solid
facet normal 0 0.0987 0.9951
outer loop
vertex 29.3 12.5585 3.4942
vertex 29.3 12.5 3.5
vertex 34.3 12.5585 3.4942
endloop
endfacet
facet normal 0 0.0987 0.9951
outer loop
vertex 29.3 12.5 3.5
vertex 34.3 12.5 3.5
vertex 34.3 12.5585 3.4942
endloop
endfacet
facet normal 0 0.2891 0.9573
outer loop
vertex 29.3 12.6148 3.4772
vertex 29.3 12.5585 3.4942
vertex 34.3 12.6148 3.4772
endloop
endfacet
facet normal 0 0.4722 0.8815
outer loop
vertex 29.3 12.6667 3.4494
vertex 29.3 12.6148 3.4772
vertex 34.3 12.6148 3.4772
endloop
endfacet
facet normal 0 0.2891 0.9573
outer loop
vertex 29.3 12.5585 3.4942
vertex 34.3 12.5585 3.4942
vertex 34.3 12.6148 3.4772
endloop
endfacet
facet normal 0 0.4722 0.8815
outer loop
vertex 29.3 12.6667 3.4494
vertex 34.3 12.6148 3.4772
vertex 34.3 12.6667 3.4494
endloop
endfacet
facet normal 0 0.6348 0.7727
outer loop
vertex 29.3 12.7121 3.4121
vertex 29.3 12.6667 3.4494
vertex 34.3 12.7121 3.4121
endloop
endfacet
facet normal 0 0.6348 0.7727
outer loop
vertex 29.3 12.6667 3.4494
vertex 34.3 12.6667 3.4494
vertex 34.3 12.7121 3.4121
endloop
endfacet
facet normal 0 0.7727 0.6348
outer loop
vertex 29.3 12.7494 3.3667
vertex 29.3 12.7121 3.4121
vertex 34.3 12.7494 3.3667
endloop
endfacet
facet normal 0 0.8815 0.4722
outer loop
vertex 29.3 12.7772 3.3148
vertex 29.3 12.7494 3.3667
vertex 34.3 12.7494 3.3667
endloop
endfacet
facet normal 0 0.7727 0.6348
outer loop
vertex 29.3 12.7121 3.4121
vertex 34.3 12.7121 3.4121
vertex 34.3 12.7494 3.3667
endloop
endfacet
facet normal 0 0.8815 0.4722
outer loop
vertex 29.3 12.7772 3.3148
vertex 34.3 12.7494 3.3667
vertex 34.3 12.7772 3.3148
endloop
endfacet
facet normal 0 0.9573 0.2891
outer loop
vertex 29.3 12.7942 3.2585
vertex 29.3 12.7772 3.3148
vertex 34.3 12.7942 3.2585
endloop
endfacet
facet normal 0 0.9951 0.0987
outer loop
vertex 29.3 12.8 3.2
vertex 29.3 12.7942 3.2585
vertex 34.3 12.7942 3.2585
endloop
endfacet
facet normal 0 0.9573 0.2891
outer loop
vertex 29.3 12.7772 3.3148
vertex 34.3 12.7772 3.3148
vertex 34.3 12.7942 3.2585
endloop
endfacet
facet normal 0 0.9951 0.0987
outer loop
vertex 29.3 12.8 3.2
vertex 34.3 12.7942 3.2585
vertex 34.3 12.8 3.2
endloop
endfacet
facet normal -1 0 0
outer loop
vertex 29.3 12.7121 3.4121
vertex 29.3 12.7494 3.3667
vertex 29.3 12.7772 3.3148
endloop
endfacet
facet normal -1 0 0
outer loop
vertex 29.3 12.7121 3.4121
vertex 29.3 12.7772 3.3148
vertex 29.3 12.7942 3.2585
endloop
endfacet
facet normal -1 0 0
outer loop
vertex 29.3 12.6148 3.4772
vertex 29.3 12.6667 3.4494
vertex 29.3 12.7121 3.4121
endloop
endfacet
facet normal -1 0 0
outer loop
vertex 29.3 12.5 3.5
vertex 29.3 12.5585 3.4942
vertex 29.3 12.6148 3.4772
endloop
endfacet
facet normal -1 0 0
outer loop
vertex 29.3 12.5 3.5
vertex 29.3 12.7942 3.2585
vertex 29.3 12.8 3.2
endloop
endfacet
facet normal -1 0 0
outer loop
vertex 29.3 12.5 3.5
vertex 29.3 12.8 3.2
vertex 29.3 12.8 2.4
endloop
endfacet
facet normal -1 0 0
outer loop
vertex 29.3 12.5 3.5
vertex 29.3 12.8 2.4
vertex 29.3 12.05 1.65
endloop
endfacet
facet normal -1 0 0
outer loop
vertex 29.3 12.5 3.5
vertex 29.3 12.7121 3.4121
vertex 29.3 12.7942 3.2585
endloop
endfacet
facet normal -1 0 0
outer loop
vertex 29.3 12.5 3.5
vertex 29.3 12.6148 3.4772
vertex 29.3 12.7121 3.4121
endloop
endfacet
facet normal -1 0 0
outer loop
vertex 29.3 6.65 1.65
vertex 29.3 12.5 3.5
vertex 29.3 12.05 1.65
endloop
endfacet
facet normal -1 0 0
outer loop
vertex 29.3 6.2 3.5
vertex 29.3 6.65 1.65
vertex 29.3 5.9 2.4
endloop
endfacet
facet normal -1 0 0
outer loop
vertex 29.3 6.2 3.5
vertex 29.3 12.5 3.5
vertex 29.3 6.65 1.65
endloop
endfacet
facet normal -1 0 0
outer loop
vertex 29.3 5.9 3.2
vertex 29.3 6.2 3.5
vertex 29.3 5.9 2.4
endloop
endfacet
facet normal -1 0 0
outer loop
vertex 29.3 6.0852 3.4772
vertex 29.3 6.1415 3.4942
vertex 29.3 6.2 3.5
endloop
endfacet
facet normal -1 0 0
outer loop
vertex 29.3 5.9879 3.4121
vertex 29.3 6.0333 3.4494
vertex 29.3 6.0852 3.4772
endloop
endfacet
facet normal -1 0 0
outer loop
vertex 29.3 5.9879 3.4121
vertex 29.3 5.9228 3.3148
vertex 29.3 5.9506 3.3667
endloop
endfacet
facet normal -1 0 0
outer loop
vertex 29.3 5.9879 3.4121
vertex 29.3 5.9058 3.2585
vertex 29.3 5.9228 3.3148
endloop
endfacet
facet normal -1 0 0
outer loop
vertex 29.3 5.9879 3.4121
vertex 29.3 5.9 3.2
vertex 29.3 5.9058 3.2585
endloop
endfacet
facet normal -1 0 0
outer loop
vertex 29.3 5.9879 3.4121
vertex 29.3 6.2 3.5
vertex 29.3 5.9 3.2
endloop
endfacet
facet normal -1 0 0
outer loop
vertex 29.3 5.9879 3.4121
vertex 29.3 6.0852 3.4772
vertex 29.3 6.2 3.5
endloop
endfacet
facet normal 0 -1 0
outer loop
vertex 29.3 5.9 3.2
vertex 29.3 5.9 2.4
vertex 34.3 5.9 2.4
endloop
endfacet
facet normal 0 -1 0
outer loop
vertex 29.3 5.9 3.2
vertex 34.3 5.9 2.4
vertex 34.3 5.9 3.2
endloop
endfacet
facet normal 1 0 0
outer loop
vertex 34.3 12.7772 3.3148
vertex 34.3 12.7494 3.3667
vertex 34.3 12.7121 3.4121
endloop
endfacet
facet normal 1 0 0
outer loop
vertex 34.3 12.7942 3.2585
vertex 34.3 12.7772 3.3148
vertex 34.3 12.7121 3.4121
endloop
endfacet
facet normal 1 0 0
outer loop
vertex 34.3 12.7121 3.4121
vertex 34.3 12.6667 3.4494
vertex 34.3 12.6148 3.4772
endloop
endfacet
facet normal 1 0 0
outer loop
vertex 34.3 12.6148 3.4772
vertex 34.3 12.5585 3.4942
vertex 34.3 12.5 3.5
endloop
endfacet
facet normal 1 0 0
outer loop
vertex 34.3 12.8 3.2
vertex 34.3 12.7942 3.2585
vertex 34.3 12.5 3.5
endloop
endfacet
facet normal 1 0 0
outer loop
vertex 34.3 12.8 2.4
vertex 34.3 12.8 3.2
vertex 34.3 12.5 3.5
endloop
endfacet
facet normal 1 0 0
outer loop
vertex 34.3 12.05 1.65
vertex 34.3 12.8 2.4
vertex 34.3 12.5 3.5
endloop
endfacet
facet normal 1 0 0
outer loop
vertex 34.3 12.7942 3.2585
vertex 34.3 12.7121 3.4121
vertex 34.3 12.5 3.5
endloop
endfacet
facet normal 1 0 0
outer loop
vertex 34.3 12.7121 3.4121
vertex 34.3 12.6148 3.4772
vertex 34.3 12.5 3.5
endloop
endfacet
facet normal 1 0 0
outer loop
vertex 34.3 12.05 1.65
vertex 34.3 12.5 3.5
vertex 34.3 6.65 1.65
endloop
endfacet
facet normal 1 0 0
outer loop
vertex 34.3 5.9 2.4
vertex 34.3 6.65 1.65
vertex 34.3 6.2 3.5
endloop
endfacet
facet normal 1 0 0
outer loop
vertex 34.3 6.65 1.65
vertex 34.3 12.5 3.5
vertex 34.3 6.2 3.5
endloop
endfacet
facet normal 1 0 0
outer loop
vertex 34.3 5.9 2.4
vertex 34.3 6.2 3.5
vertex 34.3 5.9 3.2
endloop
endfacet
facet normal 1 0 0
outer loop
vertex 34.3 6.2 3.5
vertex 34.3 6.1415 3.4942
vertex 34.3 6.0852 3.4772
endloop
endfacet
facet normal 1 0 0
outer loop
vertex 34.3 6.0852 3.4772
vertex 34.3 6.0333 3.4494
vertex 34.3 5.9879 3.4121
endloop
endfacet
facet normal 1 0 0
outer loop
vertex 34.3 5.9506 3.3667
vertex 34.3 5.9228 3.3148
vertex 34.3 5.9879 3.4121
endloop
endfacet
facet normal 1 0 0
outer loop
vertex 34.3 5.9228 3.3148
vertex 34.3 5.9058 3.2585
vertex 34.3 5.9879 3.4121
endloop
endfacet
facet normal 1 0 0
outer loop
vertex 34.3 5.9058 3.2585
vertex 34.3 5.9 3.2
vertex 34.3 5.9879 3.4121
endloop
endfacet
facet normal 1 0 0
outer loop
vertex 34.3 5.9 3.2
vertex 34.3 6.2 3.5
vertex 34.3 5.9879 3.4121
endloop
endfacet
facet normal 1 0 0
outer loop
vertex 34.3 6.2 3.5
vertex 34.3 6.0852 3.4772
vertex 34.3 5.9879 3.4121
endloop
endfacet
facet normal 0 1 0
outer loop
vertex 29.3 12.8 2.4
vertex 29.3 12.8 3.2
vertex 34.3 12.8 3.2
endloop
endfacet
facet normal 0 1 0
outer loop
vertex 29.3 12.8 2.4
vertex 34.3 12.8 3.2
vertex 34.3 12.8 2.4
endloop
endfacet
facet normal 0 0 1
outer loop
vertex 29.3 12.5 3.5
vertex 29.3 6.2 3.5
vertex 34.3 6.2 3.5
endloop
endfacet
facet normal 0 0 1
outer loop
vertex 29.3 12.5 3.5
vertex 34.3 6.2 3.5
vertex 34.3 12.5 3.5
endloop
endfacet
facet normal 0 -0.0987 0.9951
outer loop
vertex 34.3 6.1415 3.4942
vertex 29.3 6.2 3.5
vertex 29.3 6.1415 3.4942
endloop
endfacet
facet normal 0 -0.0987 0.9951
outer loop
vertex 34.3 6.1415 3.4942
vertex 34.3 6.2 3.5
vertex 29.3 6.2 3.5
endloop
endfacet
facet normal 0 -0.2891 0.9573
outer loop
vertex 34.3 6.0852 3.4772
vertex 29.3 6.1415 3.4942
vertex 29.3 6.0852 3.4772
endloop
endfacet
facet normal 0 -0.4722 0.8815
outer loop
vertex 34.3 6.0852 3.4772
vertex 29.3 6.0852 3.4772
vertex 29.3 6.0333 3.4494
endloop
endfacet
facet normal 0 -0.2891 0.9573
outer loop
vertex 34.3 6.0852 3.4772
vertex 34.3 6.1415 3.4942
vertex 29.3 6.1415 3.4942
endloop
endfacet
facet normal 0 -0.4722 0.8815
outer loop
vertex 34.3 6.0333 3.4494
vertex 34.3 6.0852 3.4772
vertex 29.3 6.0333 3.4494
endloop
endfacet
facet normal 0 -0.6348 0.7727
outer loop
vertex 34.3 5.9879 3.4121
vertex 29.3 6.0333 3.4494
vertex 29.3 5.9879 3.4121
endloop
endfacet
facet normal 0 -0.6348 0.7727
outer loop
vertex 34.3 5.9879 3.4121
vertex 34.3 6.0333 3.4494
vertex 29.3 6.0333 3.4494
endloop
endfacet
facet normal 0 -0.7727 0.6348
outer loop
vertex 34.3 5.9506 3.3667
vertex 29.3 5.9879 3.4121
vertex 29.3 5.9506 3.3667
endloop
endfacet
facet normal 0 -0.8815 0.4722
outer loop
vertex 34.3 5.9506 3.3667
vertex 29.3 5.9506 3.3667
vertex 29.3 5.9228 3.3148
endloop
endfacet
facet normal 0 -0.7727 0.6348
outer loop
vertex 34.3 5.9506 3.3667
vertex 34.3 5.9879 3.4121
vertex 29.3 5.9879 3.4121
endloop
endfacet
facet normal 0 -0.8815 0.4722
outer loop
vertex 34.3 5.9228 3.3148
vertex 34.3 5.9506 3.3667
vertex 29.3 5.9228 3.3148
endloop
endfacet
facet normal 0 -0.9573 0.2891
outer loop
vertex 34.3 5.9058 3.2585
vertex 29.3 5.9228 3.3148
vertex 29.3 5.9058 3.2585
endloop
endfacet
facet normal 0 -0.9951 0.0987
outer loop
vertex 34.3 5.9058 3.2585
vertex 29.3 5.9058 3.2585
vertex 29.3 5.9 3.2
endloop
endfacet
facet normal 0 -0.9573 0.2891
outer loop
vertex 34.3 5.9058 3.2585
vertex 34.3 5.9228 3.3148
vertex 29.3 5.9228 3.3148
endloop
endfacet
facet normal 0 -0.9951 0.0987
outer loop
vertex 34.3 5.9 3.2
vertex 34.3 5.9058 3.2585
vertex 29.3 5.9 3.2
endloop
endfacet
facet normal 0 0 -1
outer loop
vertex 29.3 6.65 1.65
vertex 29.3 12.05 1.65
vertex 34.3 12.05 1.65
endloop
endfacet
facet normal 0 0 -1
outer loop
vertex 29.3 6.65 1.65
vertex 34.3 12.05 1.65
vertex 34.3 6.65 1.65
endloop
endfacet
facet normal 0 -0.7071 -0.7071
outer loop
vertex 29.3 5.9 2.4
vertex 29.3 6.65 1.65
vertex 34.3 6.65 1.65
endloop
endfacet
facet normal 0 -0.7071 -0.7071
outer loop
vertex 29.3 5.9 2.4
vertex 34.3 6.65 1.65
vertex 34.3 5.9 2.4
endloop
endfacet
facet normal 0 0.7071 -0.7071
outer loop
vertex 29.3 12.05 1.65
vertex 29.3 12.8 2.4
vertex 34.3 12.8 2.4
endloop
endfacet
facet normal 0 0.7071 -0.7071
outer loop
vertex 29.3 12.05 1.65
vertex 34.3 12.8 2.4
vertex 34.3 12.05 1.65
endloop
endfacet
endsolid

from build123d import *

# Parameters (mm, degrees)
PAD001_DEPTH = 5
FILLET_R     = 0.3
FILLET001_R  = 0.3


with BuildPart() as part:
    # Sketch002 → Pad001 (new body)
    with BuildSketch(Plane.YZ.offset(29.3)):
        Polygon((5.9, 3.5), (12.8, 3.5), (12.8, 2.4), (12.05, 1.65), (6.65, 1.65), (5.9, 2.4), align=None)
    extrude(amount=PAD001_DEPTH)

    # Fillet
    fillet_edges = [part.edges().sort_by_distance(p)[0] for p in [
        (31.8, 5.9, 3.5),
    ]]
    fillet(fillet_edges, radius=FILLET_R)

    # Fillet001
    fillet001_edges = [part.edges().sort_by_distance(p)[0] for p in [
        (31.8, 12.8, 3.5),
    ]]
    fillet(fillet001_edges, radius=FILLET001_R)


solid = part.part
